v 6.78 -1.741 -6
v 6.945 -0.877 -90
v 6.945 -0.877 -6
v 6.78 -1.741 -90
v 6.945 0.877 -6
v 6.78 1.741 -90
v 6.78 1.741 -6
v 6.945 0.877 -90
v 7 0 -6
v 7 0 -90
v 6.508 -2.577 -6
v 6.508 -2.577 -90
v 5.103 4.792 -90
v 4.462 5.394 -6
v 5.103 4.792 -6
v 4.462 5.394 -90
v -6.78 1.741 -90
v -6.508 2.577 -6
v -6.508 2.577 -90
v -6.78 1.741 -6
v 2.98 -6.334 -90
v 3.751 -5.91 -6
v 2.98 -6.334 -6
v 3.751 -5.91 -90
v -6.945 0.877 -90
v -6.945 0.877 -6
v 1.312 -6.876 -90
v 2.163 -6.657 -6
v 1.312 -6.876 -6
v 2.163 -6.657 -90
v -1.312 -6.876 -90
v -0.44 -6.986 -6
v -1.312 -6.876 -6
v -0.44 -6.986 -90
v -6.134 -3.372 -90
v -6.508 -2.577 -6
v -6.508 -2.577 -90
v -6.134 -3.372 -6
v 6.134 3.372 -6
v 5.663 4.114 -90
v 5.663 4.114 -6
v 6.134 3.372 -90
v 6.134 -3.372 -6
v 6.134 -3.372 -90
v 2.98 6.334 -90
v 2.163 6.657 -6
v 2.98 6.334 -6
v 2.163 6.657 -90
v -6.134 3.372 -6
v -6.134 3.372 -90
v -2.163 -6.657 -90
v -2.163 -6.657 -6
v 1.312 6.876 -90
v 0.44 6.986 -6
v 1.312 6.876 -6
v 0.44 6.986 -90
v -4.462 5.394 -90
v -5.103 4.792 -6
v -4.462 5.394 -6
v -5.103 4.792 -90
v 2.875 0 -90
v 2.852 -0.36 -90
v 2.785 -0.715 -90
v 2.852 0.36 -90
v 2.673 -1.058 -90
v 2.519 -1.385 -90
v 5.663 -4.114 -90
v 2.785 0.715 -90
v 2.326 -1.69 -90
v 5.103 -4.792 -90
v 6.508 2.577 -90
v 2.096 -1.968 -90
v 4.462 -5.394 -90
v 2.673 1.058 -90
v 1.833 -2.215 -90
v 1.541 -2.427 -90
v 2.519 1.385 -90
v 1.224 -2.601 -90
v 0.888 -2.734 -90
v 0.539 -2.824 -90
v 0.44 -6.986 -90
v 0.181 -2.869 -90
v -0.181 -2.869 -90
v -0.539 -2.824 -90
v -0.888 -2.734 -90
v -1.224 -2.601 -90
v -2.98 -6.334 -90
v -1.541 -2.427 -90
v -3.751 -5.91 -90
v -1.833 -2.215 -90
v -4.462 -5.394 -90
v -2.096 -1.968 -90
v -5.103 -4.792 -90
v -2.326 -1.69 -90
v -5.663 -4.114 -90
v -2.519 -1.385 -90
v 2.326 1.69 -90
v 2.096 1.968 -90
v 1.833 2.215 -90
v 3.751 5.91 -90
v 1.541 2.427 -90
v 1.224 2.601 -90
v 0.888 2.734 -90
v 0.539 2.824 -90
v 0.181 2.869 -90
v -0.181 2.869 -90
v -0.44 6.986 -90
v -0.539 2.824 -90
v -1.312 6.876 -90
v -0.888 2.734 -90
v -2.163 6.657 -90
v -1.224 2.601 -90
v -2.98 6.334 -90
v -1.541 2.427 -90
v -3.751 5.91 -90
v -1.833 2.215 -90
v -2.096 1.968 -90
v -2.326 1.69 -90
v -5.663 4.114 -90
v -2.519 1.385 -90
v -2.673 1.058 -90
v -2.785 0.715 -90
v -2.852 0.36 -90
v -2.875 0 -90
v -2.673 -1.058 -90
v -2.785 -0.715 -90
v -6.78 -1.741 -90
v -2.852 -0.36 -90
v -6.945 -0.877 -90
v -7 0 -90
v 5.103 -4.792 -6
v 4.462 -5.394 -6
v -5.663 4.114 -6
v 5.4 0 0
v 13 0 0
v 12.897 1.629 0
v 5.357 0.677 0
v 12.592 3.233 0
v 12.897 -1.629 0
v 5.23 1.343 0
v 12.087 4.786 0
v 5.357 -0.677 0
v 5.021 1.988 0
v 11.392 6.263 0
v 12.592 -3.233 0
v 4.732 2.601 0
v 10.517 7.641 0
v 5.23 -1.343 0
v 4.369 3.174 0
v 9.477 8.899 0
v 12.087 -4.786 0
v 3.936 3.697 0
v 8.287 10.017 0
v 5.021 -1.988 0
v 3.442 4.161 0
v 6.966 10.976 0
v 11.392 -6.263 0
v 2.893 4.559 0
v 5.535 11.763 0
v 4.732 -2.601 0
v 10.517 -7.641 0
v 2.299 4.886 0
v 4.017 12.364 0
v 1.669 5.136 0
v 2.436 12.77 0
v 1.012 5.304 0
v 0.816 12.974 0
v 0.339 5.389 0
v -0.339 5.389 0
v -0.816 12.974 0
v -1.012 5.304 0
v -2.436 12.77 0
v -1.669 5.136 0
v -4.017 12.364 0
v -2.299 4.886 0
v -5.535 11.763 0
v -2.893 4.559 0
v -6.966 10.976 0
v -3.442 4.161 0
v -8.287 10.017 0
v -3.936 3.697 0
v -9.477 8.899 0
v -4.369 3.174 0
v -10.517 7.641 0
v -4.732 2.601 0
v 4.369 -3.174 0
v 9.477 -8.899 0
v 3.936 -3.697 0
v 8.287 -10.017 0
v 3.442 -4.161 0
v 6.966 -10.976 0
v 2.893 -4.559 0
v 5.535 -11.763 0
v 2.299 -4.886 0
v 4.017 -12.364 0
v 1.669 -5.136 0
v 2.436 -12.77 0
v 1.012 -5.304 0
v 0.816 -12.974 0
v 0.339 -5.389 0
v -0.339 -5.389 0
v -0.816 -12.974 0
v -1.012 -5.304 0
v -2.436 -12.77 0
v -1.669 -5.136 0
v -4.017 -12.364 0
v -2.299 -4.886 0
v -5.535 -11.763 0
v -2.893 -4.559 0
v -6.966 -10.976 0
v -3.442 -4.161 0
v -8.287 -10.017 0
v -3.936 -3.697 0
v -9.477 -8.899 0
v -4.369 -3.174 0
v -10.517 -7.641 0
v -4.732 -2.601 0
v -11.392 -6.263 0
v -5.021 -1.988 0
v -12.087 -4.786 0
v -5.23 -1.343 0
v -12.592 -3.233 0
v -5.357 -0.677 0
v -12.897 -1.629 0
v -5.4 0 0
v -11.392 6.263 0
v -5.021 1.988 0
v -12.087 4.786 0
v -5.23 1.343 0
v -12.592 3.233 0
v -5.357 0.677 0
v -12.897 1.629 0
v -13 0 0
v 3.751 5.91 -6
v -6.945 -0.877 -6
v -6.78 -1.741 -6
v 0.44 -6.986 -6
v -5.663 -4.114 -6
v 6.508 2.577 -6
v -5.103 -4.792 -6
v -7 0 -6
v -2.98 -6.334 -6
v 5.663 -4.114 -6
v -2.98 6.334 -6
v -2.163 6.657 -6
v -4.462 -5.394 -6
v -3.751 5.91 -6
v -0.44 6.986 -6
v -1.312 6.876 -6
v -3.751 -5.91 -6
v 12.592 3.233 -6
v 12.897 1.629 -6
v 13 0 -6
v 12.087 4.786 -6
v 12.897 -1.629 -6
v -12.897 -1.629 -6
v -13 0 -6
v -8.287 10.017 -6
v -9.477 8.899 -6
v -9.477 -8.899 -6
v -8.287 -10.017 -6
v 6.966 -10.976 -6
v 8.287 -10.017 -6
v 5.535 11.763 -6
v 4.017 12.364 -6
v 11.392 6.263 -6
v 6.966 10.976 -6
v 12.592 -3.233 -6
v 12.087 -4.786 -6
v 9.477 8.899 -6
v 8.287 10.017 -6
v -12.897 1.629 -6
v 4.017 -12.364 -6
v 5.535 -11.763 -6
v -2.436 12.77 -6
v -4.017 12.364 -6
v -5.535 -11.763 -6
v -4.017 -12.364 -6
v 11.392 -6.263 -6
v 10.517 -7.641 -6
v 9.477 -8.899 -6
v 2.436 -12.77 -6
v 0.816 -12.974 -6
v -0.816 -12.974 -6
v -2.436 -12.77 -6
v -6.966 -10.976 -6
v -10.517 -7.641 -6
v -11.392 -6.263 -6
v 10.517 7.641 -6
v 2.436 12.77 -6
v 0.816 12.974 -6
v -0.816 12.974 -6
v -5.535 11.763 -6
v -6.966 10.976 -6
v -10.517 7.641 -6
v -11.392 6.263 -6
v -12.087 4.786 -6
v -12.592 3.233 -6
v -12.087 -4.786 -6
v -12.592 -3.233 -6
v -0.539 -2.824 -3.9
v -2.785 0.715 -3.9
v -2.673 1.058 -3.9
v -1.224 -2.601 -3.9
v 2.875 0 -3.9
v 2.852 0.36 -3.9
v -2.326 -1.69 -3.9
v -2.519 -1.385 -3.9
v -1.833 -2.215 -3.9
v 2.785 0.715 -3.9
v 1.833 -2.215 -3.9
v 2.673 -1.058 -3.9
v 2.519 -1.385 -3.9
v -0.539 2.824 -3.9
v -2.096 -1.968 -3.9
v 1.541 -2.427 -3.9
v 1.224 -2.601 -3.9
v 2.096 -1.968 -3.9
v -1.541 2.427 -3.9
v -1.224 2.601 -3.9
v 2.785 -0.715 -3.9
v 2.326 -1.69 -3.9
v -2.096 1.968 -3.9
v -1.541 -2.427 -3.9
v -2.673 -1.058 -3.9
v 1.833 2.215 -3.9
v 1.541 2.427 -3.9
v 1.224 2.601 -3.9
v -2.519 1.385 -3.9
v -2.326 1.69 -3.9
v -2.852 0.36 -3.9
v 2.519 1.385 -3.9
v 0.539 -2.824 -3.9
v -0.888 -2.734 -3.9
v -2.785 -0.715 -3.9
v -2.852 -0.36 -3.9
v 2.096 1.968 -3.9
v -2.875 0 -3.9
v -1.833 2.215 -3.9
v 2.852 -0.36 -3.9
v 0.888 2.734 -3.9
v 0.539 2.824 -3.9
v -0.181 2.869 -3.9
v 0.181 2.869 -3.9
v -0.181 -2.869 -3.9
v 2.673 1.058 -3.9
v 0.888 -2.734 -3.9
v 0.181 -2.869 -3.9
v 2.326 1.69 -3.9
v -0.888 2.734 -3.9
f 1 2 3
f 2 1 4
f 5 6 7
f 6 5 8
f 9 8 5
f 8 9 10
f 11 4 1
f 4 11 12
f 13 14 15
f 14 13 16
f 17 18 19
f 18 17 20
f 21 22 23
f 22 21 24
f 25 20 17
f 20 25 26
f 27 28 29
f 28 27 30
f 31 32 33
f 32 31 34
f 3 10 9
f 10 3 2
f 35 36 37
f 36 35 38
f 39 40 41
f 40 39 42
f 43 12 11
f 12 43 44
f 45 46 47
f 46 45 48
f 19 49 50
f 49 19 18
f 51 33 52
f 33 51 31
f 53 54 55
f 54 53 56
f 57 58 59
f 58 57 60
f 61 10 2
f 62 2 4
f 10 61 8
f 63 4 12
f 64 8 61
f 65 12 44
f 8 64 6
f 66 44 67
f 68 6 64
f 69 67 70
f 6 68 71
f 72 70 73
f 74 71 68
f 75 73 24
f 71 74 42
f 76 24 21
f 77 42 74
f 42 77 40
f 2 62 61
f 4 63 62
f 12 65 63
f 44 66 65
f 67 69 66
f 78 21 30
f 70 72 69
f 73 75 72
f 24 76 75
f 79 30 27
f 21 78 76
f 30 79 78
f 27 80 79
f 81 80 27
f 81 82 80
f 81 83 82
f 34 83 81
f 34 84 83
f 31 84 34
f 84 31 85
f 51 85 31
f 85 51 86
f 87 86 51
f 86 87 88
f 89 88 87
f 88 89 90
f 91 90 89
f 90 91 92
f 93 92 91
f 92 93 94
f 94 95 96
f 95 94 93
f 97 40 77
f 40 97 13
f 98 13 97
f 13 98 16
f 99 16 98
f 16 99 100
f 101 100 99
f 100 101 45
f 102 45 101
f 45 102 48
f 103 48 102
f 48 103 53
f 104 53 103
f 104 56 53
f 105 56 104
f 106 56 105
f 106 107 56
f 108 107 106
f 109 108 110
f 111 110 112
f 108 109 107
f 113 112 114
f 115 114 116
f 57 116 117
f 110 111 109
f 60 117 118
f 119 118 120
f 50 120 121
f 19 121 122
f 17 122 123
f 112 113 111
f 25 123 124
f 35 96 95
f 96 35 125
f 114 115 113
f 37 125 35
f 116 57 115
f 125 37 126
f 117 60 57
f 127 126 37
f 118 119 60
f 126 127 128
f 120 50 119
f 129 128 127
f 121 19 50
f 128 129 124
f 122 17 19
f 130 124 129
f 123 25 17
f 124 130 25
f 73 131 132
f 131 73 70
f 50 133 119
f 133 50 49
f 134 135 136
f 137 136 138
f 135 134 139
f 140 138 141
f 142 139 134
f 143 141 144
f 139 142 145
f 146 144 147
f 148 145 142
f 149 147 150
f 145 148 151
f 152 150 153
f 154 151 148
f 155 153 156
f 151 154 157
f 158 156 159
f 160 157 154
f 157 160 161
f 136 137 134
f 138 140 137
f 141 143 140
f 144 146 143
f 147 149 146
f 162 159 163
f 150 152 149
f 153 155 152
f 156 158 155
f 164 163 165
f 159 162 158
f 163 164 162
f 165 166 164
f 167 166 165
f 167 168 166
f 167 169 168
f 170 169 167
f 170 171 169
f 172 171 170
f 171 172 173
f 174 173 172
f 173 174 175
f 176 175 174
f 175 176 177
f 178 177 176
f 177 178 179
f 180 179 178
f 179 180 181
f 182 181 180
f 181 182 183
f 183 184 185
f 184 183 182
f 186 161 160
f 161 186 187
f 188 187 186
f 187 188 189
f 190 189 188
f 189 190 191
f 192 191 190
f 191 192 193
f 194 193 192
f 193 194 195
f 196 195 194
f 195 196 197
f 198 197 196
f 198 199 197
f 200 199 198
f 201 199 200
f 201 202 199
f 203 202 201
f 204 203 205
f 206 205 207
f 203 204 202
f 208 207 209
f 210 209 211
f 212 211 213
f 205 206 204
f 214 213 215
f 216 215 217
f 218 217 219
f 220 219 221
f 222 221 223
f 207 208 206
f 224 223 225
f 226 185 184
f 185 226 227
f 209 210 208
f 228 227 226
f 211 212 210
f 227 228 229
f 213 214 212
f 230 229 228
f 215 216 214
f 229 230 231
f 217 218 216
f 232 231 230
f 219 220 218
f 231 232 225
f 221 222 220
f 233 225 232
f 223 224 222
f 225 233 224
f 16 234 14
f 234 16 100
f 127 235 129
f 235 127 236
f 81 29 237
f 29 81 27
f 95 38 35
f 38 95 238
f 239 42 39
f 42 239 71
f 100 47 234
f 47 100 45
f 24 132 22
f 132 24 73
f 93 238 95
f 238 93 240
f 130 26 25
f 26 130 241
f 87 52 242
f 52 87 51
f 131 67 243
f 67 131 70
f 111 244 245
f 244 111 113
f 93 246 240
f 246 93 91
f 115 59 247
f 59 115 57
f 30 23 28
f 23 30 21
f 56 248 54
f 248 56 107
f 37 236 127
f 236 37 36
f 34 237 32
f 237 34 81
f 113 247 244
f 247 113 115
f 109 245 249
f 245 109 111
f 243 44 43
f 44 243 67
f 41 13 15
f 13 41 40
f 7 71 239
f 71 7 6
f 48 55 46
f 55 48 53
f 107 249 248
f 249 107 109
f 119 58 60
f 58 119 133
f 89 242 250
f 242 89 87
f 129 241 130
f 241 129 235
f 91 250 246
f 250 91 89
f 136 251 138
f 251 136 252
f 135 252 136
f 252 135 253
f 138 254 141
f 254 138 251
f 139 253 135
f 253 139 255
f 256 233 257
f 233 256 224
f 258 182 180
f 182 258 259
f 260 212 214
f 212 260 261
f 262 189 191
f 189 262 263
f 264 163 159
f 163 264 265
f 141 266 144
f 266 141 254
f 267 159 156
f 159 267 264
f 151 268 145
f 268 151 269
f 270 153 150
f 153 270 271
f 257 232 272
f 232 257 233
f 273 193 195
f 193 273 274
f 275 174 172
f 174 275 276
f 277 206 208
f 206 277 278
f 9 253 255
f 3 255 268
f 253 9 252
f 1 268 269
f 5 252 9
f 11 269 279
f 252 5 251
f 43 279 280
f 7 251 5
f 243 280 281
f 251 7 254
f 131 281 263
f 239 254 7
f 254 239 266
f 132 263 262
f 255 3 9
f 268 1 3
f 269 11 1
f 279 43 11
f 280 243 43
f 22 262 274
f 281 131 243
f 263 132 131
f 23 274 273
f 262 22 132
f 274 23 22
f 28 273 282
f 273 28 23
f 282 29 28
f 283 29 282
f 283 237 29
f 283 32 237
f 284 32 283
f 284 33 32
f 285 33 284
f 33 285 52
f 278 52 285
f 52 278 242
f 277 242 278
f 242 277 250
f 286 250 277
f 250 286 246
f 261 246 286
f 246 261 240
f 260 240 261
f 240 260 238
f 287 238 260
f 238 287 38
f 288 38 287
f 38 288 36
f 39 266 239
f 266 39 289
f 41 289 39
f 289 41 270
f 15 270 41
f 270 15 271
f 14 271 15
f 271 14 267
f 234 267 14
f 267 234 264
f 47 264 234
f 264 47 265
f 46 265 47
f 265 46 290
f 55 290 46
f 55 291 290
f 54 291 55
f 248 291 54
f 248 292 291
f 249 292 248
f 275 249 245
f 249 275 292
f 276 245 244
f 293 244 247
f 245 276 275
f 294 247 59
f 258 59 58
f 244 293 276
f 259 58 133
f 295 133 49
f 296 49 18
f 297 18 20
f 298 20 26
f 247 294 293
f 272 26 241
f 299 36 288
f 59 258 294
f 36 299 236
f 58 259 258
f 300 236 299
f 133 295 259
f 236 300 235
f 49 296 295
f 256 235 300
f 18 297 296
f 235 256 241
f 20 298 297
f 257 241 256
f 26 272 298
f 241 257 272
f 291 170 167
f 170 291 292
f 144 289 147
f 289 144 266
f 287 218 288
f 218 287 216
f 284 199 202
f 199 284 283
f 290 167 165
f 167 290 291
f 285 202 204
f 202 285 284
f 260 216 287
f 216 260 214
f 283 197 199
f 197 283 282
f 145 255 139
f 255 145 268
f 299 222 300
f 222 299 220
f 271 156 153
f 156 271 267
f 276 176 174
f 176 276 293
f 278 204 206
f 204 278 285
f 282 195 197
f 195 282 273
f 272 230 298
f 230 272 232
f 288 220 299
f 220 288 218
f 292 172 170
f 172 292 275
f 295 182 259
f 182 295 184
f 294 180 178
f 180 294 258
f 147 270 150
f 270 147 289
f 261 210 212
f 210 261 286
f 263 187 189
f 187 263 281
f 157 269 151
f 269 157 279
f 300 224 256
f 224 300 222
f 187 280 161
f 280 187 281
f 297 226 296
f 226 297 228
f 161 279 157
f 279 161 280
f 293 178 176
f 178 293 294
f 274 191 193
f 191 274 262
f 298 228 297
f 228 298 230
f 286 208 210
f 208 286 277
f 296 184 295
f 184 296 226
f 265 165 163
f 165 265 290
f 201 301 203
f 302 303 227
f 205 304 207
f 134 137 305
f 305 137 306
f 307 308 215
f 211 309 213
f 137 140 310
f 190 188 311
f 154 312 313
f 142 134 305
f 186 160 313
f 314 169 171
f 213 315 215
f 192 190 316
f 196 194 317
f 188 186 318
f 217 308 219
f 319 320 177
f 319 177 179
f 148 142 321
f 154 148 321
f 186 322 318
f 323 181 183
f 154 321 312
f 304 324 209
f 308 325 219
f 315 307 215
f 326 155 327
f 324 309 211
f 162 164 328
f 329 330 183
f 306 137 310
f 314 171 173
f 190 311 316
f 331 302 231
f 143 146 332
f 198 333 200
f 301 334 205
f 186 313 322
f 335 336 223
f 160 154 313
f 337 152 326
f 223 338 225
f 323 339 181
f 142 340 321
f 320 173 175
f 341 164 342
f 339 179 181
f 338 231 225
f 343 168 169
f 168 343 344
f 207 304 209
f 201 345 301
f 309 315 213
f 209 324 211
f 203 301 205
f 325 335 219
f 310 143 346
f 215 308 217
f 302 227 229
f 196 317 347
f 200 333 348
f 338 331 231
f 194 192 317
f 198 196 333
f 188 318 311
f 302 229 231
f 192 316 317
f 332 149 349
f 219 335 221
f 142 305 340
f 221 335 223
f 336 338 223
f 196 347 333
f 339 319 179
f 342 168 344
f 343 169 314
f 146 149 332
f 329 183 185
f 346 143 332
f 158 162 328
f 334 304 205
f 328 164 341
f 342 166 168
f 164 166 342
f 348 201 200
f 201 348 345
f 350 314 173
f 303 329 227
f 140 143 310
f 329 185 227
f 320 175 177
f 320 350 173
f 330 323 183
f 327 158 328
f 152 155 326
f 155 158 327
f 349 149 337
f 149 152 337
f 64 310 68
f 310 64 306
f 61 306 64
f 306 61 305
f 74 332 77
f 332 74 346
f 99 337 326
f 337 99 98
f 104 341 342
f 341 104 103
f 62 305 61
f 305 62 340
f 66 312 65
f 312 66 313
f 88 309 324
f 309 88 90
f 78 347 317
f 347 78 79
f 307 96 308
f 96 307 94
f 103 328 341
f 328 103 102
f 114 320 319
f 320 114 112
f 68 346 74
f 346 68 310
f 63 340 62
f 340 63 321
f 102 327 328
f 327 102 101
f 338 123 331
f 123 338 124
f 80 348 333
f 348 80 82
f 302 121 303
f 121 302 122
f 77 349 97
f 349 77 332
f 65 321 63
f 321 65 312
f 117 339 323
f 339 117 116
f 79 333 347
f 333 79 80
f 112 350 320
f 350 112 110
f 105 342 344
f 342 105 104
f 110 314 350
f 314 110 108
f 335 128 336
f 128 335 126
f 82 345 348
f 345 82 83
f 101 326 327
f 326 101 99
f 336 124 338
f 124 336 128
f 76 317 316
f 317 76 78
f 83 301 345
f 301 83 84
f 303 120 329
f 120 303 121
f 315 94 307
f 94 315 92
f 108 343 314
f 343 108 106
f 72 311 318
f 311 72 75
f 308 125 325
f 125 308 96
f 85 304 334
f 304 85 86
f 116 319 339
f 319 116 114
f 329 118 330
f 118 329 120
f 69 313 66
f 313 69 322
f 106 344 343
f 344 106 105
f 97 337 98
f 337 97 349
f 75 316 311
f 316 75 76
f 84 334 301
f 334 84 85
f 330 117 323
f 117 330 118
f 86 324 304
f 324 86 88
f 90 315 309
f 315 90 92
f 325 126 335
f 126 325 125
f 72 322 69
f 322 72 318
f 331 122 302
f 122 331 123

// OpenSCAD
$fn = 50;


difference() {
	union() {
		translate(v = [0, 0, -90.0000000000]) {
			cylinder(h = 90, r = 7.0000000000);
		}
		translate(v = [0, 0, -6.0000000000]) {
			cylinder(h = 6, r = 13.0000000000);
		}
	}
	union() {
		translate(v = [0, 0, 0]) {
			rotate(a = [0, 0, 0]) {
				difference() {
					union() {
						#translate(v = [0, 0, -90.0000000000]) {
							cylinder(h = 90, r = 2.6000000000);
						}
						#translate(v = [0, 0, -3.9000000000]) {
							cylinder(h = 3.9000000000, r1 = 2.8750000000, r2 = 5.4000000000);
						}
						#translate(v = [0, 0, -90.0000000000]) {
							cylinder(h = 90, r = 2.8750000000);
						}
						#translate(v = [0, 0, -90.0000000000]) {
							cylinder(h = 90, r = 2.6000000000);
						}
					}
					union();
				}
			}
		}
	}
}
